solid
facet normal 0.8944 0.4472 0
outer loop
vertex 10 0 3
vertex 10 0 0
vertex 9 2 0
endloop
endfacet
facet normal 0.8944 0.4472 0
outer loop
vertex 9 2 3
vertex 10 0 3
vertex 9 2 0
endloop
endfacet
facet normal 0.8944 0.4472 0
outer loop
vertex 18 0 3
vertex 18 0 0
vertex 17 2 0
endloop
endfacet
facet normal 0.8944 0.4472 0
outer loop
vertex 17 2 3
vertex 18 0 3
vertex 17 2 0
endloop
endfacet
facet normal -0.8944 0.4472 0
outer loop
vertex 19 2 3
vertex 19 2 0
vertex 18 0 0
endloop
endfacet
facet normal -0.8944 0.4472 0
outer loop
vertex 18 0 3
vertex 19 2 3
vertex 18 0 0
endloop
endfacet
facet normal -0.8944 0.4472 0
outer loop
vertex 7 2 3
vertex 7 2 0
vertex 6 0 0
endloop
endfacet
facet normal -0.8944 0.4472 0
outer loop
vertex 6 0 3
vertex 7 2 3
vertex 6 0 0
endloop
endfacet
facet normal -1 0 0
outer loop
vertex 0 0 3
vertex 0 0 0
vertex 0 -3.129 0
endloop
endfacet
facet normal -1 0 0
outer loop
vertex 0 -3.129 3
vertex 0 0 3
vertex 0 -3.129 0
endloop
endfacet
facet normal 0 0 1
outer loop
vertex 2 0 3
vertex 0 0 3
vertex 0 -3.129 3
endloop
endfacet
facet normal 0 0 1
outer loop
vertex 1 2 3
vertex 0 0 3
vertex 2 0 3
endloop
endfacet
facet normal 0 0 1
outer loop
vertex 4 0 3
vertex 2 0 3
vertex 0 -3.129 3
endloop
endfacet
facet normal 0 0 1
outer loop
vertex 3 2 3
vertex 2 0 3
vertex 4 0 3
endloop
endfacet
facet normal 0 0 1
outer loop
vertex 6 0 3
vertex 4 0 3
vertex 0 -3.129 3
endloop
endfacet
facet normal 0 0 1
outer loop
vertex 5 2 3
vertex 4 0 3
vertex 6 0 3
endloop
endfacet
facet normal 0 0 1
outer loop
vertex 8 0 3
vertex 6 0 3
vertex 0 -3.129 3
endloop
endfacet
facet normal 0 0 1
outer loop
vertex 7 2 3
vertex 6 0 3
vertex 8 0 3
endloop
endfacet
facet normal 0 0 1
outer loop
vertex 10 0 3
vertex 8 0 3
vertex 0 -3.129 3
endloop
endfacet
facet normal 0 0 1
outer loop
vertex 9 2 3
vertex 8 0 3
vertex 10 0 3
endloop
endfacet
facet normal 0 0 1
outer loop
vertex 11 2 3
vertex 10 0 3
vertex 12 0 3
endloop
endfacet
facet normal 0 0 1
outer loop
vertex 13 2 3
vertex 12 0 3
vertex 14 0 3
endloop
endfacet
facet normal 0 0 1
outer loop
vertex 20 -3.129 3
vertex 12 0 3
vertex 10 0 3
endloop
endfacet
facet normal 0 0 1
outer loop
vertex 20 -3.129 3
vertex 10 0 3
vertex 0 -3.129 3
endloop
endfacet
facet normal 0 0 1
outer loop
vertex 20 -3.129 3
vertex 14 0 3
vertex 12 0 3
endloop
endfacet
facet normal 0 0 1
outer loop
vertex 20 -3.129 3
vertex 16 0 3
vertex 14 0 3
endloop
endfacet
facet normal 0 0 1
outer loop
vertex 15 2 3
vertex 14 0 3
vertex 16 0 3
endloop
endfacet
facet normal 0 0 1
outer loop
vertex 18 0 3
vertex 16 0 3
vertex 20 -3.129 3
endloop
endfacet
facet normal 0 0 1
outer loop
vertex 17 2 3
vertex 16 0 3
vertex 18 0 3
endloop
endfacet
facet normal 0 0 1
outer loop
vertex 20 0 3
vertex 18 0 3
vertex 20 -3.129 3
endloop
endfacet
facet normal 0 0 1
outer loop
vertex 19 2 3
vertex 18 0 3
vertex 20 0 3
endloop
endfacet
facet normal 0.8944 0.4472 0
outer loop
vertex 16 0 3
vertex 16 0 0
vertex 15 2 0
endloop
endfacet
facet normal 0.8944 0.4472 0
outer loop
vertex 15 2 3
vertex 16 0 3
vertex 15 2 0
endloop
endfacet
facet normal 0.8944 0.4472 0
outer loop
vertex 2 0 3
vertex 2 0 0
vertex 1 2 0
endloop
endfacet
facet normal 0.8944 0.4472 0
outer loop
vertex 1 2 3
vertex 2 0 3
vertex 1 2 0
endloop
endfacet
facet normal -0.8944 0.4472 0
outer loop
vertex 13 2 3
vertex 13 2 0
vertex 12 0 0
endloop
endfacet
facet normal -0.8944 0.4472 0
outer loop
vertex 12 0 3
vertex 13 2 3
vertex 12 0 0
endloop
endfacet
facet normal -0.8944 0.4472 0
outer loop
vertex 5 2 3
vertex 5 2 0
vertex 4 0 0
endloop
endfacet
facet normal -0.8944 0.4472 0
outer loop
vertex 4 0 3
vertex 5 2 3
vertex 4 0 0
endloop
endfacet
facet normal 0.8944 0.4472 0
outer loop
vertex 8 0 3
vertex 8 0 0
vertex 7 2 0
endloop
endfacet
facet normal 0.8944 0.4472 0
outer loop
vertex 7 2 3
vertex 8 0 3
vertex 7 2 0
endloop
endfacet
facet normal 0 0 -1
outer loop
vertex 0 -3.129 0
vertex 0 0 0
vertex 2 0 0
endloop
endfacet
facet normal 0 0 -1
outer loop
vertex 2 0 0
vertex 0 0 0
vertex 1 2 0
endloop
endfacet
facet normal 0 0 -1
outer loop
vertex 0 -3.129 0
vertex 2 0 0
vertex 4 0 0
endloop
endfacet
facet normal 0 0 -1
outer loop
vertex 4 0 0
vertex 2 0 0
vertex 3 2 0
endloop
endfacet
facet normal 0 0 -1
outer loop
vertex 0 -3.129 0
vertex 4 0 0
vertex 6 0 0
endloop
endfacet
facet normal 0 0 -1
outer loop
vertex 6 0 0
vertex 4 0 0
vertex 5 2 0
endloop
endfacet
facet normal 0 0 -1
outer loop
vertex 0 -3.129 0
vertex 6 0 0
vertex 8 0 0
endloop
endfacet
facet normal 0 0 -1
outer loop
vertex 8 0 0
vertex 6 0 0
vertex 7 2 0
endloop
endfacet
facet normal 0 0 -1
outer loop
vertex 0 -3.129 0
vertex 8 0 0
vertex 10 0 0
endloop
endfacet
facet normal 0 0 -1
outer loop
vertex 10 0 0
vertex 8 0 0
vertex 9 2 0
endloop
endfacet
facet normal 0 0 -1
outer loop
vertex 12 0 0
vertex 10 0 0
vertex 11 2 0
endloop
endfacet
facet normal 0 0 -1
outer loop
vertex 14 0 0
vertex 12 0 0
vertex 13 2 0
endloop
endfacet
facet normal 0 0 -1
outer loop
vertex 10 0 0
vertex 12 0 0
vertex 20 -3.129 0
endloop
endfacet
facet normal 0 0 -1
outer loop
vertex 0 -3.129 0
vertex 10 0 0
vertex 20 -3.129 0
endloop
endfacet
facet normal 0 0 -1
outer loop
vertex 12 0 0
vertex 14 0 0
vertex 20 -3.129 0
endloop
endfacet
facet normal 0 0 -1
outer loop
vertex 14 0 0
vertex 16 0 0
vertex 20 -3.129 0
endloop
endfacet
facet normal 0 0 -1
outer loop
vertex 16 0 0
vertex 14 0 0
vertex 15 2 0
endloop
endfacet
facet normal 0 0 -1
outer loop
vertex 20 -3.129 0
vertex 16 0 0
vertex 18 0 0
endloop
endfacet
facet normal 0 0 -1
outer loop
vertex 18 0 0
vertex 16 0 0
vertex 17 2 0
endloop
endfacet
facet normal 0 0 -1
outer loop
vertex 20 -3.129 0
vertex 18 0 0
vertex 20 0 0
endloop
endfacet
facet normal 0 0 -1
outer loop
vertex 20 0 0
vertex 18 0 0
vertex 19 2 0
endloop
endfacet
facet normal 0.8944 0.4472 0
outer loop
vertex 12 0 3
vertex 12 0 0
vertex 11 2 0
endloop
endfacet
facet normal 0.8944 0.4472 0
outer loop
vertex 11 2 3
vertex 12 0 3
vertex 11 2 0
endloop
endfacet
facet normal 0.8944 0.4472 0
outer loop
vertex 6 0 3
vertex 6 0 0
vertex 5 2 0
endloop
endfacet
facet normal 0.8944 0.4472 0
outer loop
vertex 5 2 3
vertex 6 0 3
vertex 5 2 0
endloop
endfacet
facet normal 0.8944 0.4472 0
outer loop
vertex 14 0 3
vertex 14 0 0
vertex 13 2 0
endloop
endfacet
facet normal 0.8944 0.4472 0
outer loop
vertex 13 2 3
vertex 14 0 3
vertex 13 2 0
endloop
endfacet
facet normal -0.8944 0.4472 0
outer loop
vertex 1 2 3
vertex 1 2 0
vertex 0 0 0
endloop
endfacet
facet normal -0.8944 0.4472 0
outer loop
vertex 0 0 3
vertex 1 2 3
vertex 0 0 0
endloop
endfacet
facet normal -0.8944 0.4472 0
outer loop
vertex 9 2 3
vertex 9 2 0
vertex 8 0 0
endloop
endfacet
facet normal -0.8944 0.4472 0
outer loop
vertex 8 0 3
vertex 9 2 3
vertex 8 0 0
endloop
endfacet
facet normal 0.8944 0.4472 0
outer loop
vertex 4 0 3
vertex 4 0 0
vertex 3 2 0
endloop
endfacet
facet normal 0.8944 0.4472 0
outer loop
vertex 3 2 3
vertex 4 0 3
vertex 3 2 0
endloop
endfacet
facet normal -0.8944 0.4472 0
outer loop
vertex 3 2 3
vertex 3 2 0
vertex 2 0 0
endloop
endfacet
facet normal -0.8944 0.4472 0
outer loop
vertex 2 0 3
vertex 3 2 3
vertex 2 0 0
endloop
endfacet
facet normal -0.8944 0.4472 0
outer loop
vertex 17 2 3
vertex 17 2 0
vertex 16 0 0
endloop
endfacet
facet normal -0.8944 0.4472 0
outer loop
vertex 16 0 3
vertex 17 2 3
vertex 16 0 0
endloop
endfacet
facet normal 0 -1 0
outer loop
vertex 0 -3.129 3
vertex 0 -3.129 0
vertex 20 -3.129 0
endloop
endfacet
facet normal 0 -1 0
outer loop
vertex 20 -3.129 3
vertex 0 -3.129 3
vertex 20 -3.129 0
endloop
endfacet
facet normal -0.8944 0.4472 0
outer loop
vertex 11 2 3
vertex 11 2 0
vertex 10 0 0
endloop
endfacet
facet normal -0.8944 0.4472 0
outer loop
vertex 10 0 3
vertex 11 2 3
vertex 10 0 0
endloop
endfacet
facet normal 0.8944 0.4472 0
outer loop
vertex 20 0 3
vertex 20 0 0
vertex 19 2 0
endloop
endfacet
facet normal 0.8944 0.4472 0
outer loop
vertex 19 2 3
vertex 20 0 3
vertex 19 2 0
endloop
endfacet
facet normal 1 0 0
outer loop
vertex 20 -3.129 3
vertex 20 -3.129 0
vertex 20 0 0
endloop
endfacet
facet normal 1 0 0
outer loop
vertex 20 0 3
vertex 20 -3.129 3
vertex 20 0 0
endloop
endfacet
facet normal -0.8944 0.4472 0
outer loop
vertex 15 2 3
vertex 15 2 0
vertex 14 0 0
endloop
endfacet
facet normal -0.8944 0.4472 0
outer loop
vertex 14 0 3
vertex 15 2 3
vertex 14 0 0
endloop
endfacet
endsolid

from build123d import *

# Parameters (mm, degrees)
F1_DEPTH = 3


with BuildPart() as f1:
    # F0 (on Top) → F1 (new body)
    with BuildSketch(Plane.XY):
        Polygon((1, 2), (0, 0), (2, 0), align=None)
        Polygon((2, 0), (0, 0), (0, -3.129371), (20, -3.129371), (20, 0), (18, 0), (16, 0), (14, 0), (12, 0), (10, 0), (8, 0), (6, 0), (4, 0), align=None)
        Polygon((3, 2), (2, 0), (4, 0), align=None)
        Polygon((5, 2), (4, 0), (6, 0), align=None)
        Polygon((7, 2), (6, 0), (8, 0), align=None)
        Polygon((18, 0), (20, 0), (19, 2), align=None)
        Polygon((9, 2), (8, 0), (10, 0), align=None)
        Polygon((16, 0), (18, 0), (17, 2), align=None)
        Polygon((11, 2), (10, 0), (12, 0), align=None)
        Polygon((14, 0), (16, 0), (15, 2), align=None)
        Polygon((13, 2), (12, 0), (14, 0), align=None)
    extrude(amount=F1_DEPTH)


solid = f1.part
